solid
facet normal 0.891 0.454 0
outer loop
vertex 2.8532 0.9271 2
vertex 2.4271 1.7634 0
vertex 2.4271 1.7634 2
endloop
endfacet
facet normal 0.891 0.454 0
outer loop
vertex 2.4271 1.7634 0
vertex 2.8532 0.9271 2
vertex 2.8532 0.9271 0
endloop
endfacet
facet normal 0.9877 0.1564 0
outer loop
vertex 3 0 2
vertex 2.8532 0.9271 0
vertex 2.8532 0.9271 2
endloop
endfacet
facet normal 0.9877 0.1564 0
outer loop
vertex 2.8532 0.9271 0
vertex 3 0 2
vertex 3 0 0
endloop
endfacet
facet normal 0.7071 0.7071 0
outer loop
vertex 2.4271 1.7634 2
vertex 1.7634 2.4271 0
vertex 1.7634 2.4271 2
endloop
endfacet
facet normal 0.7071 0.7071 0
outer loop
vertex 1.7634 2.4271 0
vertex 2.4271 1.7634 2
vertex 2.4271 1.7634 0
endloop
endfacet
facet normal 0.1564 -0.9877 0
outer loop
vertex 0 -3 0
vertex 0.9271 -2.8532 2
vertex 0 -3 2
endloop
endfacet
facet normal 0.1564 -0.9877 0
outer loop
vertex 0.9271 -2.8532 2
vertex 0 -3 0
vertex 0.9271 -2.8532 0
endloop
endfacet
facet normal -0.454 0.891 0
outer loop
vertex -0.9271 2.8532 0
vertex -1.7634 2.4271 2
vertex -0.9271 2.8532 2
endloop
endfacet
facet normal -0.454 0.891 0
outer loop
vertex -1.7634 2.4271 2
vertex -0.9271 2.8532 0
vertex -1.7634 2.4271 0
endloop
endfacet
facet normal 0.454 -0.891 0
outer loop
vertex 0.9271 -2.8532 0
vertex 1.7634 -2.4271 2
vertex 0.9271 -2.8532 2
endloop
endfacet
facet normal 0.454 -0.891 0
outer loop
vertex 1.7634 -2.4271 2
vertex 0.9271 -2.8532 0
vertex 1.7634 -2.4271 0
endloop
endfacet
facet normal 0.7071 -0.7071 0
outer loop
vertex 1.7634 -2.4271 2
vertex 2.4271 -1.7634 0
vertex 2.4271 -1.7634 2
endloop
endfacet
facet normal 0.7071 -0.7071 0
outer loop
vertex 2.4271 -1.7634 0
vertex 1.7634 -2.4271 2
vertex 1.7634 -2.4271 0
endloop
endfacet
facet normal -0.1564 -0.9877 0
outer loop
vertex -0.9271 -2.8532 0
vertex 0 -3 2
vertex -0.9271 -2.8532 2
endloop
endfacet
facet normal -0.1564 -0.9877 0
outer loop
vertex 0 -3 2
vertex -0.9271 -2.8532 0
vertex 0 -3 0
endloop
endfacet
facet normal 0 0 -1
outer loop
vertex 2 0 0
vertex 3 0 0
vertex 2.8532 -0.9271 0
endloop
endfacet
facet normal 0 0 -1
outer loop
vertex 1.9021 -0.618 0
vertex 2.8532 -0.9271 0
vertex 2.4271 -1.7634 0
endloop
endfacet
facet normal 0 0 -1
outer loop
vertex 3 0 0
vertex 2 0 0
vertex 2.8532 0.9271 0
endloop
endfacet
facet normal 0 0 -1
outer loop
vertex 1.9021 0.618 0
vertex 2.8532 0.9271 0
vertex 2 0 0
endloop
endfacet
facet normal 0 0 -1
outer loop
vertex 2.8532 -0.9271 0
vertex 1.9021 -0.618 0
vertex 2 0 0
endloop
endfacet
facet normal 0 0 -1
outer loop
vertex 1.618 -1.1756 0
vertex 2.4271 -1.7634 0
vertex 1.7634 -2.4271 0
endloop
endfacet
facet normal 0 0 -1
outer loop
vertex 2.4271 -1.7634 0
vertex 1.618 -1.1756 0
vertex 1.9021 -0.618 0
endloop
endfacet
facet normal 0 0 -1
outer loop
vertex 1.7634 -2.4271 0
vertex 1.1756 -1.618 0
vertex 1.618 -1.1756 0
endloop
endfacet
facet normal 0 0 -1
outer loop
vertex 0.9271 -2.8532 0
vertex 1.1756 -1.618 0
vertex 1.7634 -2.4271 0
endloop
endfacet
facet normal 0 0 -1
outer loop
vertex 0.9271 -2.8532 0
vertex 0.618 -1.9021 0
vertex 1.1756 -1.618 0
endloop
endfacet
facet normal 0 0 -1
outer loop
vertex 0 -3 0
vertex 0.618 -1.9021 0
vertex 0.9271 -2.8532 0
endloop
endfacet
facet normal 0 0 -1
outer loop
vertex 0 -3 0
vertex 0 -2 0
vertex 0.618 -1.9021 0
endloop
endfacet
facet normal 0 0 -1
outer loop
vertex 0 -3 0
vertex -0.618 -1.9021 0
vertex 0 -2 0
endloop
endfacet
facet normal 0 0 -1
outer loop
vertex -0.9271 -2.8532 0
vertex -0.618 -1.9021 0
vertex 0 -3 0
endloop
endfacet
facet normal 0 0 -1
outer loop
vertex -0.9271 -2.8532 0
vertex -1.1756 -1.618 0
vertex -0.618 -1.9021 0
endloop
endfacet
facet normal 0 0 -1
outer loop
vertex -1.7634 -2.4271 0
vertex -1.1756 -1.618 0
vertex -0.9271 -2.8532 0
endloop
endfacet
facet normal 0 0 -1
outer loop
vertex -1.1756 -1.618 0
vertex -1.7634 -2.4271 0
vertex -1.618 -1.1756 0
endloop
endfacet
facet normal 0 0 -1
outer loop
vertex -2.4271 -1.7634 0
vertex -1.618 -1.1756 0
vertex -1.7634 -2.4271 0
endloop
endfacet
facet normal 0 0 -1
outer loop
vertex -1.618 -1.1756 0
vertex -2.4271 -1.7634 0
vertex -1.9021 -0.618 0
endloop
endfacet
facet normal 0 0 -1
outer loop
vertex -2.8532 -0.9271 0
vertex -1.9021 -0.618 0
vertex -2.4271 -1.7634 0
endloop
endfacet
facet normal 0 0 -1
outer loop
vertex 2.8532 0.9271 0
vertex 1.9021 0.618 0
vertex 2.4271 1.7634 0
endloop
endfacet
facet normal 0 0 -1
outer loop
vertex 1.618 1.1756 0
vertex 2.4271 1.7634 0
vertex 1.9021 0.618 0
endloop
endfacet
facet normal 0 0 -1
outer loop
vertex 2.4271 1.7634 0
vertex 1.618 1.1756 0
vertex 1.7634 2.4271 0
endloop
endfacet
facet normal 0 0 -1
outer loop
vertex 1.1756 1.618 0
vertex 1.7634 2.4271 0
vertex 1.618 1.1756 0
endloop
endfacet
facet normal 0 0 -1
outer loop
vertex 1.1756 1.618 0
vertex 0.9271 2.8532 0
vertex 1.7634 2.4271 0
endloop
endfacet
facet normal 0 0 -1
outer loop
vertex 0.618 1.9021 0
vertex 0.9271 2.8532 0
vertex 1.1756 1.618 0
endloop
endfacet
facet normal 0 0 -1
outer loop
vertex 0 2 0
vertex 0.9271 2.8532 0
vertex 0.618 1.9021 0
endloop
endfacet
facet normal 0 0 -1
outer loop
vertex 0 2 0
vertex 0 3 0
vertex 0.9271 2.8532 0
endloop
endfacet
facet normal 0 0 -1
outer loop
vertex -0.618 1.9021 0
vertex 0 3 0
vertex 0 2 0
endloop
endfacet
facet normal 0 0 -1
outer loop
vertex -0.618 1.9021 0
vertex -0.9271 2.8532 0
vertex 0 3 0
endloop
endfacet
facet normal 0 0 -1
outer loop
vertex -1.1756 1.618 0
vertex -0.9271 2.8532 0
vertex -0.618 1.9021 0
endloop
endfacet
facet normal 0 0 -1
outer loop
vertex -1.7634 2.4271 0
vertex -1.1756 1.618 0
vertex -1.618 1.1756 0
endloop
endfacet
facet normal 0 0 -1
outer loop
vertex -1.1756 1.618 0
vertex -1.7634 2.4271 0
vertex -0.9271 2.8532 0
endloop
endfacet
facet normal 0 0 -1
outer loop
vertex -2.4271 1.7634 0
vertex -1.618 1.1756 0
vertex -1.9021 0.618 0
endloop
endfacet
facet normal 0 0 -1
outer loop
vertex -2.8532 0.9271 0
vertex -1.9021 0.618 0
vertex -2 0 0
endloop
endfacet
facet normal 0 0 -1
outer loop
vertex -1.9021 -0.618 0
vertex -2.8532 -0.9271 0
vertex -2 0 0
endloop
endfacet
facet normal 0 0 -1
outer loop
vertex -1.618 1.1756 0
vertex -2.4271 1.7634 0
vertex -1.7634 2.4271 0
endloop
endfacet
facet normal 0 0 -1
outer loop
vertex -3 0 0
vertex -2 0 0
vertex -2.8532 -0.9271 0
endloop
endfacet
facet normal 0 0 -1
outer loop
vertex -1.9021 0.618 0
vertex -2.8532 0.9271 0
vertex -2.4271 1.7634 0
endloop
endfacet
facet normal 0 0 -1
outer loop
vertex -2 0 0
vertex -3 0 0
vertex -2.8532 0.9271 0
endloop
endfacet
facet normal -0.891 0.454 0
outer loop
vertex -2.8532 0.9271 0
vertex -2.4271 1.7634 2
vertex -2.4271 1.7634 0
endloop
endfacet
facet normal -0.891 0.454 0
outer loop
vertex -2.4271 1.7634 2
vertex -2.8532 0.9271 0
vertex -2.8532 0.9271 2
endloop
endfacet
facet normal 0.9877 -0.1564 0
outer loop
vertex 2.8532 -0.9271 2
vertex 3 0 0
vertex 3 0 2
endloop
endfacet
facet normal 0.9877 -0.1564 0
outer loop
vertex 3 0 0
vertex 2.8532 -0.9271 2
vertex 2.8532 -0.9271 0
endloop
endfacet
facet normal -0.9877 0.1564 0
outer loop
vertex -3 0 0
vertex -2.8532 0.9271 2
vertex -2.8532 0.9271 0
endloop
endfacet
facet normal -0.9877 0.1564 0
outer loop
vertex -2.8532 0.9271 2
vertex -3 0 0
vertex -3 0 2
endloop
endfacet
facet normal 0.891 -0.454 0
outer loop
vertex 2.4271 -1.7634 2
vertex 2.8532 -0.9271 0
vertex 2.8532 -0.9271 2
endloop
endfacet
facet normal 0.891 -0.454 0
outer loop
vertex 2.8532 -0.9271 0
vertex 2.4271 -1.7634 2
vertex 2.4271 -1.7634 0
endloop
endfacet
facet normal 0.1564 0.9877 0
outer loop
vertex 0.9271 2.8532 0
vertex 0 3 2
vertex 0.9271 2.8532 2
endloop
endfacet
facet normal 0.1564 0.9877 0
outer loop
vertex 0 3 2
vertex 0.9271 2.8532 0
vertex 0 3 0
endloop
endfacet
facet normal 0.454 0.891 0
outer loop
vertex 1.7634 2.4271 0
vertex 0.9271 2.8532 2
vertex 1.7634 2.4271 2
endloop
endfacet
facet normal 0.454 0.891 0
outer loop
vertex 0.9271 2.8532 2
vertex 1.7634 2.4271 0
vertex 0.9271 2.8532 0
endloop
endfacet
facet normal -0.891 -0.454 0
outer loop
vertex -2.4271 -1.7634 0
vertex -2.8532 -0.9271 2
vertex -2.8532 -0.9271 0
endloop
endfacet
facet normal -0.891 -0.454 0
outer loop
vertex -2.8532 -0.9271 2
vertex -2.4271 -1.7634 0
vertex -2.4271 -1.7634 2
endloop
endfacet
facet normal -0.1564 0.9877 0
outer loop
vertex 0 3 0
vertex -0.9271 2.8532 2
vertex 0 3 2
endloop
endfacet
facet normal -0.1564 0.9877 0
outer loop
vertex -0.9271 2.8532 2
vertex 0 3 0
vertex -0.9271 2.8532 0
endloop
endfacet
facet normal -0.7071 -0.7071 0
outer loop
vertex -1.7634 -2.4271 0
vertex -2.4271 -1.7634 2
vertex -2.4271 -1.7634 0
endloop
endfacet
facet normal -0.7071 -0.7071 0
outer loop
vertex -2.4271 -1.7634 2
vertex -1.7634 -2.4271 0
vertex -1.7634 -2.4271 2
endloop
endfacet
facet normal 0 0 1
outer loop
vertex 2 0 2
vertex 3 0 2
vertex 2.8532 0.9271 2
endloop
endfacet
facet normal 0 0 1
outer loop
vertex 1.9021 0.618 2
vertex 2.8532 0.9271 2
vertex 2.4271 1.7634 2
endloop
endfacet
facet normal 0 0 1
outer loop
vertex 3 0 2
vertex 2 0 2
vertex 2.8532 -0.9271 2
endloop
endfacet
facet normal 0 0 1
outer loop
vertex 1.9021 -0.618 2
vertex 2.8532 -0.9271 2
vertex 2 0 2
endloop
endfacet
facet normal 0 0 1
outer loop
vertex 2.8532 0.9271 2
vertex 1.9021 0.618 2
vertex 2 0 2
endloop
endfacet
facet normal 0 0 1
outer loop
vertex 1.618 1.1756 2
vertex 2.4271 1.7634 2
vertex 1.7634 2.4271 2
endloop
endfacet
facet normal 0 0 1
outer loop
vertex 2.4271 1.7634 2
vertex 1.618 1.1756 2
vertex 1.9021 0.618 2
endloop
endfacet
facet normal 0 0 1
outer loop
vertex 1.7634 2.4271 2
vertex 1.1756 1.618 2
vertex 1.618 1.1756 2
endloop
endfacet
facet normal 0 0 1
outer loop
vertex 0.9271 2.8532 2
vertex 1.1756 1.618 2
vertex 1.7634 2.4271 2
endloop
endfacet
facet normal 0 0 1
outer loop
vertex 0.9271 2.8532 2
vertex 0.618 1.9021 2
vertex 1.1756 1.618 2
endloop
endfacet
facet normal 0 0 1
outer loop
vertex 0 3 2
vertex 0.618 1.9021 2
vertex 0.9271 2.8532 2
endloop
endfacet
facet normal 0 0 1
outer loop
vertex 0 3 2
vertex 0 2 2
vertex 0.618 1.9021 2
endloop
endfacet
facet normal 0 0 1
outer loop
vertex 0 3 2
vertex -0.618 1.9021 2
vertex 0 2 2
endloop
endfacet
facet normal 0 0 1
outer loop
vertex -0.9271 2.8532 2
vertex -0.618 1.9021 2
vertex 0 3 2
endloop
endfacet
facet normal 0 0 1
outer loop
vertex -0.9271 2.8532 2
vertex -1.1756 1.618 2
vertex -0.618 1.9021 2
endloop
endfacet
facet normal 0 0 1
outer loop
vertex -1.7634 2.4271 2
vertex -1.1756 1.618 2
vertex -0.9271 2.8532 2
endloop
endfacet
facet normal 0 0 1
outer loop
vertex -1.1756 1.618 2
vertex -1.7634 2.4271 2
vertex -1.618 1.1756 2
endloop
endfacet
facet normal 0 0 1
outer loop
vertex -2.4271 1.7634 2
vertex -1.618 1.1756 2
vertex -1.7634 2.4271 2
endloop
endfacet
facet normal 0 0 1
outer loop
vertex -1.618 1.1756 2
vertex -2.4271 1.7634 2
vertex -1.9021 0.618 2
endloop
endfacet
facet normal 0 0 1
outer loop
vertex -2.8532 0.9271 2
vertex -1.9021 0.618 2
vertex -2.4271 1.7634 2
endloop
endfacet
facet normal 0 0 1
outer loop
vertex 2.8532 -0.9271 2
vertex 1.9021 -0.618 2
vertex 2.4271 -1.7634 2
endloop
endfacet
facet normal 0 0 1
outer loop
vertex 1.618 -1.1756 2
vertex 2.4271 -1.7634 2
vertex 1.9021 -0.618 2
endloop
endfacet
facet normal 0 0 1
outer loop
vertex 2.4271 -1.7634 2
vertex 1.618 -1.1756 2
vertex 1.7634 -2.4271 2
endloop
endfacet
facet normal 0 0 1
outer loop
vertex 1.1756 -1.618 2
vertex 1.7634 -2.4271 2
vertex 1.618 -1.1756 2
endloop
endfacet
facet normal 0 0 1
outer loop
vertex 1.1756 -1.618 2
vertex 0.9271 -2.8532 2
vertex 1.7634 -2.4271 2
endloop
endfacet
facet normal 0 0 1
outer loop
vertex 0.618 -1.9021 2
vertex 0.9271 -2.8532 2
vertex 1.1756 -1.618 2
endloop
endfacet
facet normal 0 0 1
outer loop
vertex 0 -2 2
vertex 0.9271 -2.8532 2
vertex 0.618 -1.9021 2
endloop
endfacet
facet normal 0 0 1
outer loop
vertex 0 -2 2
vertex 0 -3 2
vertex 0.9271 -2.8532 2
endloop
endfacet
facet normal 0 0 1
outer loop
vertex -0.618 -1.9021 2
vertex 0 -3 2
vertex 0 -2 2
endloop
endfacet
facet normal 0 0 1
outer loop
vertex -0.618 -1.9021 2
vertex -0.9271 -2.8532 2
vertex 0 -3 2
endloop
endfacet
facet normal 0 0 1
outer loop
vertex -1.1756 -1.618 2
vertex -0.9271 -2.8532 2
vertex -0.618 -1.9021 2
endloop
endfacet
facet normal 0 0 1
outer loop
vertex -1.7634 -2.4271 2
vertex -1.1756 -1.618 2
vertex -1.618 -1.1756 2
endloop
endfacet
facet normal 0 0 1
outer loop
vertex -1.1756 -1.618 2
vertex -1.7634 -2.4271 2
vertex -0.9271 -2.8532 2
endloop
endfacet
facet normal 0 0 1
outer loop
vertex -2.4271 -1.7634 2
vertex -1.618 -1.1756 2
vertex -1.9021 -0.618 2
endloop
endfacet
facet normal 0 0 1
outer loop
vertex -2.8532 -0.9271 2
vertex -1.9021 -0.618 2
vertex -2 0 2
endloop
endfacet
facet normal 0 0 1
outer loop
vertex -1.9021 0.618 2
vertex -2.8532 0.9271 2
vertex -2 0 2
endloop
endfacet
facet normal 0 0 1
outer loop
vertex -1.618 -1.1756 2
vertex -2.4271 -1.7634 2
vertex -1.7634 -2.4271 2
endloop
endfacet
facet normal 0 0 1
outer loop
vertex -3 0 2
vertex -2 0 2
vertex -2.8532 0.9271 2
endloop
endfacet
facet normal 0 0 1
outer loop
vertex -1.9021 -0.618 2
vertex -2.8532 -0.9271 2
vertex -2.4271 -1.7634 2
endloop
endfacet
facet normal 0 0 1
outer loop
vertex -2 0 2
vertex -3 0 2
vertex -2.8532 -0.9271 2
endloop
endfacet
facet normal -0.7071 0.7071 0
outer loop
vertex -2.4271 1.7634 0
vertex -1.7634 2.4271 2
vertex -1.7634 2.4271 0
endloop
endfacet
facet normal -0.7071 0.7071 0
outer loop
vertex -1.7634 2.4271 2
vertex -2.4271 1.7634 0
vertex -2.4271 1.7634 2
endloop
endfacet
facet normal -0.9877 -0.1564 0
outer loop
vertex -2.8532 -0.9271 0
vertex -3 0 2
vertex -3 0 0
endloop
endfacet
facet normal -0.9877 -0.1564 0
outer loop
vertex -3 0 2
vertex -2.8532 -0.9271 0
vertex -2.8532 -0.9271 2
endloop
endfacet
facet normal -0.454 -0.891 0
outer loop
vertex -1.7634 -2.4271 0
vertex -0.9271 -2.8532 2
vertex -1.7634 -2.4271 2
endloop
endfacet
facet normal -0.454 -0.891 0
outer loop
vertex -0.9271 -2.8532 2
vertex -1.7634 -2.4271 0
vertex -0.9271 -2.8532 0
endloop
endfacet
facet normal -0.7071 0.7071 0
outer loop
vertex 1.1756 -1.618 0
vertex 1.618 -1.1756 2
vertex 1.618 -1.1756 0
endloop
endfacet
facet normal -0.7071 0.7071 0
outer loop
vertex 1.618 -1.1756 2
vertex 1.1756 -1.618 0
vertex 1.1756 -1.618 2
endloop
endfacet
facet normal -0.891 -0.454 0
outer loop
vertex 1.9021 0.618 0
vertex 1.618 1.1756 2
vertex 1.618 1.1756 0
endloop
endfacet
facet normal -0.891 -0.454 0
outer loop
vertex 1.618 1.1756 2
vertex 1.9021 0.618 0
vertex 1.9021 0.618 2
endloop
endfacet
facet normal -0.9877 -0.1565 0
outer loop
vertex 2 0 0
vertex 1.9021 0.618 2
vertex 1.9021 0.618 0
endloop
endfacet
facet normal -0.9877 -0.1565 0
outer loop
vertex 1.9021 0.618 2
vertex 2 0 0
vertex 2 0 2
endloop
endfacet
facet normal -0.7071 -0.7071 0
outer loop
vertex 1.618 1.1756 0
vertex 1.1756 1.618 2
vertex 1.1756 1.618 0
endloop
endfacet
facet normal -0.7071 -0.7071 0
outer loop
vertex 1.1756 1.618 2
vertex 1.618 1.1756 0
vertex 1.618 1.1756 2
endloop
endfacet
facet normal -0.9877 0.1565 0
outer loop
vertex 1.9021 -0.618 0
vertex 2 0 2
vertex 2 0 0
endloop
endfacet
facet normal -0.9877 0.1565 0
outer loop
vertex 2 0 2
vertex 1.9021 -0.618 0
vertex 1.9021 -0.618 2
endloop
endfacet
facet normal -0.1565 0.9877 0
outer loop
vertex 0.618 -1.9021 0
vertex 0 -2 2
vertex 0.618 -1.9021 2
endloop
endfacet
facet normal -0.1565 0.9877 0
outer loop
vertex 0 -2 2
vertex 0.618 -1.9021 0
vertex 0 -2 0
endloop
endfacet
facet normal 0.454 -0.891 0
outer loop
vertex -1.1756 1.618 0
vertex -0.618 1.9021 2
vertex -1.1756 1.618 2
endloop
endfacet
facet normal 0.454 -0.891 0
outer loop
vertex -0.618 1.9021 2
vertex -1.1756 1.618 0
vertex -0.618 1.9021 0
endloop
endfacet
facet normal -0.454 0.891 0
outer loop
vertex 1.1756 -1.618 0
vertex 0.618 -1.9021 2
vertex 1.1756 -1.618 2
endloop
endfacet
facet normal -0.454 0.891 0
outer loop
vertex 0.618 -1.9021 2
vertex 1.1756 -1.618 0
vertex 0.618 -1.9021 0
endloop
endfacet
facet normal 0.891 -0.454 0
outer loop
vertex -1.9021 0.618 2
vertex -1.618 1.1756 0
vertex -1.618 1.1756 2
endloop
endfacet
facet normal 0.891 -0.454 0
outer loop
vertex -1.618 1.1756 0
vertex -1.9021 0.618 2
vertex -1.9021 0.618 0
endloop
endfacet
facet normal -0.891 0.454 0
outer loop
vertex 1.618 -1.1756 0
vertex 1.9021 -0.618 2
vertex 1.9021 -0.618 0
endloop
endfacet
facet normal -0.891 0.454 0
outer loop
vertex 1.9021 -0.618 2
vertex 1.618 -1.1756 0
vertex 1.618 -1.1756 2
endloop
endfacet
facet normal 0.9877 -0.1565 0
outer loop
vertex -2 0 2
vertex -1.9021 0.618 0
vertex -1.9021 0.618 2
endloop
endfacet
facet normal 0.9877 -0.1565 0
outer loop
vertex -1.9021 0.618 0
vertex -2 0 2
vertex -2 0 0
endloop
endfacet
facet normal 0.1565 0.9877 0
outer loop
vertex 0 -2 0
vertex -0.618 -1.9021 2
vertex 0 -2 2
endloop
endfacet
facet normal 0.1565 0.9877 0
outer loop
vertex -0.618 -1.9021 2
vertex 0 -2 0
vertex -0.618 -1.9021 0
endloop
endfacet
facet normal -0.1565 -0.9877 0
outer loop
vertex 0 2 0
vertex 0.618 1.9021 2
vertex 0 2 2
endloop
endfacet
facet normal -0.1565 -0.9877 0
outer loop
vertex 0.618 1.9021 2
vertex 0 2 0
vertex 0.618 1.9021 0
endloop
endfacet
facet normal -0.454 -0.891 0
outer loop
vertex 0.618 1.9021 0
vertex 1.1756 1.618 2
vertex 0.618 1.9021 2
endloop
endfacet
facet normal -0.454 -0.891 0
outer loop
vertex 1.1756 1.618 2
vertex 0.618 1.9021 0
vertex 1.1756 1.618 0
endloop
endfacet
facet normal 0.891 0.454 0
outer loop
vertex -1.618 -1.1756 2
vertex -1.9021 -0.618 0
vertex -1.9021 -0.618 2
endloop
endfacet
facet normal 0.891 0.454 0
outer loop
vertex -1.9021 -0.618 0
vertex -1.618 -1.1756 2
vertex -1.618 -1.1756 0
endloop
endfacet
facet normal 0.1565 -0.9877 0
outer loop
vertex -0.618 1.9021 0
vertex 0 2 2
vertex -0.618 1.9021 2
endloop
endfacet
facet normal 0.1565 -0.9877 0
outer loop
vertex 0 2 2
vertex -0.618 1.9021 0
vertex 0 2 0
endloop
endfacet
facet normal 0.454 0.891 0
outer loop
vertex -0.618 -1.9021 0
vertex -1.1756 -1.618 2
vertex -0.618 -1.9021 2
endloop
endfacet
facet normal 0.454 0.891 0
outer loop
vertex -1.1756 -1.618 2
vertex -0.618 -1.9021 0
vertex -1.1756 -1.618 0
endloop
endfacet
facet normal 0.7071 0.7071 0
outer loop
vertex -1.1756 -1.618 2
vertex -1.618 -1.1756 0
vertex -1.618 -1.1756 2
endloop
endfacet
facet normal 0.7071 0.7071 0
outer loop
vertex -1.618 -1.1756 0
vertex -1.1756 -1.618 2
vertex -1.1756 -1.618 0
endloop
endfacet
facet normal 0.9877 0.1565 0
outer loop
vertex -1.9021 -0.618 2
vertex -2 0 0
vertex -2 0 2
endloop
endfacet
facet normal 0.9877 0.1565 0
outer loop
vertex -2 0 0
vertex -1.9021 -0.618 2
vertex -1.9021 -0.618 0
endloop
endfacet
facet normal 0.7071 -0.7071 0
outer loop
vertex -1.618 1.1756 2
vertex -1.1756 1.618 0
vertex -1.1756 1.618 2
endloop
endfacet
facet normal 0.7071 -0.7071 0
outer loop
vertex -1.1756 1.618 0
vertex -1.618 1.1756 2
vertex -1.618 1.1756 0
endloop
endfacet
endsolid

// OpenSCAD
//
// This is a catalogu of shapes that are used in other structures.  Each shape is
// parameterized to make them more flexible.
//
//===================================
// Triangular prism type 1.  This takes the form of an isosolese right triangle.
// The triangle is oriented with the hypotonuse in the y direction.  Extrusion is in the
// z direction.  Origin is at one end of the hypotonuse.
//
// Parameters
// s - size of triangle (length of hypotonuse)
// l - length of prism
//
module bbs_prism1(s, l)
{
    linear_extrude(height=l) polygon([[0, 0], [0, s], [s/2, s/2]]);
}
//
//===================================
// Triangular prism type 2.  This takes the form of an isosolese right triangle.
// The triangle is oriented with the right angle at the origin.  Extrusion is in the
// z direction.
//
// Parameters
// s - size of triangle (length of sides)
// l - length of prism
//
module bbs_prism2(s, l)
{
    linear_extrude(height=l) polygon([[0, 0], [0, s], [s, 0]]);
}
//
//===================================
// Fillet.  This is a square with a circle removed from it.  The circle
// has a radius equal to the square's sides and is positioned at one of the corners.  The
// length is in the z  direction.
//
// Parameters
// s - size of fillet
// l - length of extrusion
//
module bbs_fillet(s, l)
{
    difference()
    {
        cube([s, s, l]);
        translate([s, s, -0.1]) cylinder(r=s, h=l+0.2);
    }
}
//
//===================================
// Spacer.  This is a cylinder with a cylinder removed from the center of it.  It
// would typically be used to around a bolt to add some space like a standoff or
// as a washer.
//
// Parameters
// od - outside diameter
// id - inside diameter
// height - height
//
module bbs_spacer(od, id, height)
{
    difference()
    {
        cylinder(r=od/2, h=height, $fn=20);
        translate([0, 0, -0.1]) cylinder(r=id/2, h=height + 0.2, $fn=20);
    }
}
//
// Examples
//
//bbs_prism1(3, 5);
//translate([0, 7, 0]) bbs_prism2(3, 5);
//translate([7, 0, 0]) bbs_fillet(3, 5);
//bbs_spacer(23, 10, 16);
bbs_spacer(6, 4, 2);
